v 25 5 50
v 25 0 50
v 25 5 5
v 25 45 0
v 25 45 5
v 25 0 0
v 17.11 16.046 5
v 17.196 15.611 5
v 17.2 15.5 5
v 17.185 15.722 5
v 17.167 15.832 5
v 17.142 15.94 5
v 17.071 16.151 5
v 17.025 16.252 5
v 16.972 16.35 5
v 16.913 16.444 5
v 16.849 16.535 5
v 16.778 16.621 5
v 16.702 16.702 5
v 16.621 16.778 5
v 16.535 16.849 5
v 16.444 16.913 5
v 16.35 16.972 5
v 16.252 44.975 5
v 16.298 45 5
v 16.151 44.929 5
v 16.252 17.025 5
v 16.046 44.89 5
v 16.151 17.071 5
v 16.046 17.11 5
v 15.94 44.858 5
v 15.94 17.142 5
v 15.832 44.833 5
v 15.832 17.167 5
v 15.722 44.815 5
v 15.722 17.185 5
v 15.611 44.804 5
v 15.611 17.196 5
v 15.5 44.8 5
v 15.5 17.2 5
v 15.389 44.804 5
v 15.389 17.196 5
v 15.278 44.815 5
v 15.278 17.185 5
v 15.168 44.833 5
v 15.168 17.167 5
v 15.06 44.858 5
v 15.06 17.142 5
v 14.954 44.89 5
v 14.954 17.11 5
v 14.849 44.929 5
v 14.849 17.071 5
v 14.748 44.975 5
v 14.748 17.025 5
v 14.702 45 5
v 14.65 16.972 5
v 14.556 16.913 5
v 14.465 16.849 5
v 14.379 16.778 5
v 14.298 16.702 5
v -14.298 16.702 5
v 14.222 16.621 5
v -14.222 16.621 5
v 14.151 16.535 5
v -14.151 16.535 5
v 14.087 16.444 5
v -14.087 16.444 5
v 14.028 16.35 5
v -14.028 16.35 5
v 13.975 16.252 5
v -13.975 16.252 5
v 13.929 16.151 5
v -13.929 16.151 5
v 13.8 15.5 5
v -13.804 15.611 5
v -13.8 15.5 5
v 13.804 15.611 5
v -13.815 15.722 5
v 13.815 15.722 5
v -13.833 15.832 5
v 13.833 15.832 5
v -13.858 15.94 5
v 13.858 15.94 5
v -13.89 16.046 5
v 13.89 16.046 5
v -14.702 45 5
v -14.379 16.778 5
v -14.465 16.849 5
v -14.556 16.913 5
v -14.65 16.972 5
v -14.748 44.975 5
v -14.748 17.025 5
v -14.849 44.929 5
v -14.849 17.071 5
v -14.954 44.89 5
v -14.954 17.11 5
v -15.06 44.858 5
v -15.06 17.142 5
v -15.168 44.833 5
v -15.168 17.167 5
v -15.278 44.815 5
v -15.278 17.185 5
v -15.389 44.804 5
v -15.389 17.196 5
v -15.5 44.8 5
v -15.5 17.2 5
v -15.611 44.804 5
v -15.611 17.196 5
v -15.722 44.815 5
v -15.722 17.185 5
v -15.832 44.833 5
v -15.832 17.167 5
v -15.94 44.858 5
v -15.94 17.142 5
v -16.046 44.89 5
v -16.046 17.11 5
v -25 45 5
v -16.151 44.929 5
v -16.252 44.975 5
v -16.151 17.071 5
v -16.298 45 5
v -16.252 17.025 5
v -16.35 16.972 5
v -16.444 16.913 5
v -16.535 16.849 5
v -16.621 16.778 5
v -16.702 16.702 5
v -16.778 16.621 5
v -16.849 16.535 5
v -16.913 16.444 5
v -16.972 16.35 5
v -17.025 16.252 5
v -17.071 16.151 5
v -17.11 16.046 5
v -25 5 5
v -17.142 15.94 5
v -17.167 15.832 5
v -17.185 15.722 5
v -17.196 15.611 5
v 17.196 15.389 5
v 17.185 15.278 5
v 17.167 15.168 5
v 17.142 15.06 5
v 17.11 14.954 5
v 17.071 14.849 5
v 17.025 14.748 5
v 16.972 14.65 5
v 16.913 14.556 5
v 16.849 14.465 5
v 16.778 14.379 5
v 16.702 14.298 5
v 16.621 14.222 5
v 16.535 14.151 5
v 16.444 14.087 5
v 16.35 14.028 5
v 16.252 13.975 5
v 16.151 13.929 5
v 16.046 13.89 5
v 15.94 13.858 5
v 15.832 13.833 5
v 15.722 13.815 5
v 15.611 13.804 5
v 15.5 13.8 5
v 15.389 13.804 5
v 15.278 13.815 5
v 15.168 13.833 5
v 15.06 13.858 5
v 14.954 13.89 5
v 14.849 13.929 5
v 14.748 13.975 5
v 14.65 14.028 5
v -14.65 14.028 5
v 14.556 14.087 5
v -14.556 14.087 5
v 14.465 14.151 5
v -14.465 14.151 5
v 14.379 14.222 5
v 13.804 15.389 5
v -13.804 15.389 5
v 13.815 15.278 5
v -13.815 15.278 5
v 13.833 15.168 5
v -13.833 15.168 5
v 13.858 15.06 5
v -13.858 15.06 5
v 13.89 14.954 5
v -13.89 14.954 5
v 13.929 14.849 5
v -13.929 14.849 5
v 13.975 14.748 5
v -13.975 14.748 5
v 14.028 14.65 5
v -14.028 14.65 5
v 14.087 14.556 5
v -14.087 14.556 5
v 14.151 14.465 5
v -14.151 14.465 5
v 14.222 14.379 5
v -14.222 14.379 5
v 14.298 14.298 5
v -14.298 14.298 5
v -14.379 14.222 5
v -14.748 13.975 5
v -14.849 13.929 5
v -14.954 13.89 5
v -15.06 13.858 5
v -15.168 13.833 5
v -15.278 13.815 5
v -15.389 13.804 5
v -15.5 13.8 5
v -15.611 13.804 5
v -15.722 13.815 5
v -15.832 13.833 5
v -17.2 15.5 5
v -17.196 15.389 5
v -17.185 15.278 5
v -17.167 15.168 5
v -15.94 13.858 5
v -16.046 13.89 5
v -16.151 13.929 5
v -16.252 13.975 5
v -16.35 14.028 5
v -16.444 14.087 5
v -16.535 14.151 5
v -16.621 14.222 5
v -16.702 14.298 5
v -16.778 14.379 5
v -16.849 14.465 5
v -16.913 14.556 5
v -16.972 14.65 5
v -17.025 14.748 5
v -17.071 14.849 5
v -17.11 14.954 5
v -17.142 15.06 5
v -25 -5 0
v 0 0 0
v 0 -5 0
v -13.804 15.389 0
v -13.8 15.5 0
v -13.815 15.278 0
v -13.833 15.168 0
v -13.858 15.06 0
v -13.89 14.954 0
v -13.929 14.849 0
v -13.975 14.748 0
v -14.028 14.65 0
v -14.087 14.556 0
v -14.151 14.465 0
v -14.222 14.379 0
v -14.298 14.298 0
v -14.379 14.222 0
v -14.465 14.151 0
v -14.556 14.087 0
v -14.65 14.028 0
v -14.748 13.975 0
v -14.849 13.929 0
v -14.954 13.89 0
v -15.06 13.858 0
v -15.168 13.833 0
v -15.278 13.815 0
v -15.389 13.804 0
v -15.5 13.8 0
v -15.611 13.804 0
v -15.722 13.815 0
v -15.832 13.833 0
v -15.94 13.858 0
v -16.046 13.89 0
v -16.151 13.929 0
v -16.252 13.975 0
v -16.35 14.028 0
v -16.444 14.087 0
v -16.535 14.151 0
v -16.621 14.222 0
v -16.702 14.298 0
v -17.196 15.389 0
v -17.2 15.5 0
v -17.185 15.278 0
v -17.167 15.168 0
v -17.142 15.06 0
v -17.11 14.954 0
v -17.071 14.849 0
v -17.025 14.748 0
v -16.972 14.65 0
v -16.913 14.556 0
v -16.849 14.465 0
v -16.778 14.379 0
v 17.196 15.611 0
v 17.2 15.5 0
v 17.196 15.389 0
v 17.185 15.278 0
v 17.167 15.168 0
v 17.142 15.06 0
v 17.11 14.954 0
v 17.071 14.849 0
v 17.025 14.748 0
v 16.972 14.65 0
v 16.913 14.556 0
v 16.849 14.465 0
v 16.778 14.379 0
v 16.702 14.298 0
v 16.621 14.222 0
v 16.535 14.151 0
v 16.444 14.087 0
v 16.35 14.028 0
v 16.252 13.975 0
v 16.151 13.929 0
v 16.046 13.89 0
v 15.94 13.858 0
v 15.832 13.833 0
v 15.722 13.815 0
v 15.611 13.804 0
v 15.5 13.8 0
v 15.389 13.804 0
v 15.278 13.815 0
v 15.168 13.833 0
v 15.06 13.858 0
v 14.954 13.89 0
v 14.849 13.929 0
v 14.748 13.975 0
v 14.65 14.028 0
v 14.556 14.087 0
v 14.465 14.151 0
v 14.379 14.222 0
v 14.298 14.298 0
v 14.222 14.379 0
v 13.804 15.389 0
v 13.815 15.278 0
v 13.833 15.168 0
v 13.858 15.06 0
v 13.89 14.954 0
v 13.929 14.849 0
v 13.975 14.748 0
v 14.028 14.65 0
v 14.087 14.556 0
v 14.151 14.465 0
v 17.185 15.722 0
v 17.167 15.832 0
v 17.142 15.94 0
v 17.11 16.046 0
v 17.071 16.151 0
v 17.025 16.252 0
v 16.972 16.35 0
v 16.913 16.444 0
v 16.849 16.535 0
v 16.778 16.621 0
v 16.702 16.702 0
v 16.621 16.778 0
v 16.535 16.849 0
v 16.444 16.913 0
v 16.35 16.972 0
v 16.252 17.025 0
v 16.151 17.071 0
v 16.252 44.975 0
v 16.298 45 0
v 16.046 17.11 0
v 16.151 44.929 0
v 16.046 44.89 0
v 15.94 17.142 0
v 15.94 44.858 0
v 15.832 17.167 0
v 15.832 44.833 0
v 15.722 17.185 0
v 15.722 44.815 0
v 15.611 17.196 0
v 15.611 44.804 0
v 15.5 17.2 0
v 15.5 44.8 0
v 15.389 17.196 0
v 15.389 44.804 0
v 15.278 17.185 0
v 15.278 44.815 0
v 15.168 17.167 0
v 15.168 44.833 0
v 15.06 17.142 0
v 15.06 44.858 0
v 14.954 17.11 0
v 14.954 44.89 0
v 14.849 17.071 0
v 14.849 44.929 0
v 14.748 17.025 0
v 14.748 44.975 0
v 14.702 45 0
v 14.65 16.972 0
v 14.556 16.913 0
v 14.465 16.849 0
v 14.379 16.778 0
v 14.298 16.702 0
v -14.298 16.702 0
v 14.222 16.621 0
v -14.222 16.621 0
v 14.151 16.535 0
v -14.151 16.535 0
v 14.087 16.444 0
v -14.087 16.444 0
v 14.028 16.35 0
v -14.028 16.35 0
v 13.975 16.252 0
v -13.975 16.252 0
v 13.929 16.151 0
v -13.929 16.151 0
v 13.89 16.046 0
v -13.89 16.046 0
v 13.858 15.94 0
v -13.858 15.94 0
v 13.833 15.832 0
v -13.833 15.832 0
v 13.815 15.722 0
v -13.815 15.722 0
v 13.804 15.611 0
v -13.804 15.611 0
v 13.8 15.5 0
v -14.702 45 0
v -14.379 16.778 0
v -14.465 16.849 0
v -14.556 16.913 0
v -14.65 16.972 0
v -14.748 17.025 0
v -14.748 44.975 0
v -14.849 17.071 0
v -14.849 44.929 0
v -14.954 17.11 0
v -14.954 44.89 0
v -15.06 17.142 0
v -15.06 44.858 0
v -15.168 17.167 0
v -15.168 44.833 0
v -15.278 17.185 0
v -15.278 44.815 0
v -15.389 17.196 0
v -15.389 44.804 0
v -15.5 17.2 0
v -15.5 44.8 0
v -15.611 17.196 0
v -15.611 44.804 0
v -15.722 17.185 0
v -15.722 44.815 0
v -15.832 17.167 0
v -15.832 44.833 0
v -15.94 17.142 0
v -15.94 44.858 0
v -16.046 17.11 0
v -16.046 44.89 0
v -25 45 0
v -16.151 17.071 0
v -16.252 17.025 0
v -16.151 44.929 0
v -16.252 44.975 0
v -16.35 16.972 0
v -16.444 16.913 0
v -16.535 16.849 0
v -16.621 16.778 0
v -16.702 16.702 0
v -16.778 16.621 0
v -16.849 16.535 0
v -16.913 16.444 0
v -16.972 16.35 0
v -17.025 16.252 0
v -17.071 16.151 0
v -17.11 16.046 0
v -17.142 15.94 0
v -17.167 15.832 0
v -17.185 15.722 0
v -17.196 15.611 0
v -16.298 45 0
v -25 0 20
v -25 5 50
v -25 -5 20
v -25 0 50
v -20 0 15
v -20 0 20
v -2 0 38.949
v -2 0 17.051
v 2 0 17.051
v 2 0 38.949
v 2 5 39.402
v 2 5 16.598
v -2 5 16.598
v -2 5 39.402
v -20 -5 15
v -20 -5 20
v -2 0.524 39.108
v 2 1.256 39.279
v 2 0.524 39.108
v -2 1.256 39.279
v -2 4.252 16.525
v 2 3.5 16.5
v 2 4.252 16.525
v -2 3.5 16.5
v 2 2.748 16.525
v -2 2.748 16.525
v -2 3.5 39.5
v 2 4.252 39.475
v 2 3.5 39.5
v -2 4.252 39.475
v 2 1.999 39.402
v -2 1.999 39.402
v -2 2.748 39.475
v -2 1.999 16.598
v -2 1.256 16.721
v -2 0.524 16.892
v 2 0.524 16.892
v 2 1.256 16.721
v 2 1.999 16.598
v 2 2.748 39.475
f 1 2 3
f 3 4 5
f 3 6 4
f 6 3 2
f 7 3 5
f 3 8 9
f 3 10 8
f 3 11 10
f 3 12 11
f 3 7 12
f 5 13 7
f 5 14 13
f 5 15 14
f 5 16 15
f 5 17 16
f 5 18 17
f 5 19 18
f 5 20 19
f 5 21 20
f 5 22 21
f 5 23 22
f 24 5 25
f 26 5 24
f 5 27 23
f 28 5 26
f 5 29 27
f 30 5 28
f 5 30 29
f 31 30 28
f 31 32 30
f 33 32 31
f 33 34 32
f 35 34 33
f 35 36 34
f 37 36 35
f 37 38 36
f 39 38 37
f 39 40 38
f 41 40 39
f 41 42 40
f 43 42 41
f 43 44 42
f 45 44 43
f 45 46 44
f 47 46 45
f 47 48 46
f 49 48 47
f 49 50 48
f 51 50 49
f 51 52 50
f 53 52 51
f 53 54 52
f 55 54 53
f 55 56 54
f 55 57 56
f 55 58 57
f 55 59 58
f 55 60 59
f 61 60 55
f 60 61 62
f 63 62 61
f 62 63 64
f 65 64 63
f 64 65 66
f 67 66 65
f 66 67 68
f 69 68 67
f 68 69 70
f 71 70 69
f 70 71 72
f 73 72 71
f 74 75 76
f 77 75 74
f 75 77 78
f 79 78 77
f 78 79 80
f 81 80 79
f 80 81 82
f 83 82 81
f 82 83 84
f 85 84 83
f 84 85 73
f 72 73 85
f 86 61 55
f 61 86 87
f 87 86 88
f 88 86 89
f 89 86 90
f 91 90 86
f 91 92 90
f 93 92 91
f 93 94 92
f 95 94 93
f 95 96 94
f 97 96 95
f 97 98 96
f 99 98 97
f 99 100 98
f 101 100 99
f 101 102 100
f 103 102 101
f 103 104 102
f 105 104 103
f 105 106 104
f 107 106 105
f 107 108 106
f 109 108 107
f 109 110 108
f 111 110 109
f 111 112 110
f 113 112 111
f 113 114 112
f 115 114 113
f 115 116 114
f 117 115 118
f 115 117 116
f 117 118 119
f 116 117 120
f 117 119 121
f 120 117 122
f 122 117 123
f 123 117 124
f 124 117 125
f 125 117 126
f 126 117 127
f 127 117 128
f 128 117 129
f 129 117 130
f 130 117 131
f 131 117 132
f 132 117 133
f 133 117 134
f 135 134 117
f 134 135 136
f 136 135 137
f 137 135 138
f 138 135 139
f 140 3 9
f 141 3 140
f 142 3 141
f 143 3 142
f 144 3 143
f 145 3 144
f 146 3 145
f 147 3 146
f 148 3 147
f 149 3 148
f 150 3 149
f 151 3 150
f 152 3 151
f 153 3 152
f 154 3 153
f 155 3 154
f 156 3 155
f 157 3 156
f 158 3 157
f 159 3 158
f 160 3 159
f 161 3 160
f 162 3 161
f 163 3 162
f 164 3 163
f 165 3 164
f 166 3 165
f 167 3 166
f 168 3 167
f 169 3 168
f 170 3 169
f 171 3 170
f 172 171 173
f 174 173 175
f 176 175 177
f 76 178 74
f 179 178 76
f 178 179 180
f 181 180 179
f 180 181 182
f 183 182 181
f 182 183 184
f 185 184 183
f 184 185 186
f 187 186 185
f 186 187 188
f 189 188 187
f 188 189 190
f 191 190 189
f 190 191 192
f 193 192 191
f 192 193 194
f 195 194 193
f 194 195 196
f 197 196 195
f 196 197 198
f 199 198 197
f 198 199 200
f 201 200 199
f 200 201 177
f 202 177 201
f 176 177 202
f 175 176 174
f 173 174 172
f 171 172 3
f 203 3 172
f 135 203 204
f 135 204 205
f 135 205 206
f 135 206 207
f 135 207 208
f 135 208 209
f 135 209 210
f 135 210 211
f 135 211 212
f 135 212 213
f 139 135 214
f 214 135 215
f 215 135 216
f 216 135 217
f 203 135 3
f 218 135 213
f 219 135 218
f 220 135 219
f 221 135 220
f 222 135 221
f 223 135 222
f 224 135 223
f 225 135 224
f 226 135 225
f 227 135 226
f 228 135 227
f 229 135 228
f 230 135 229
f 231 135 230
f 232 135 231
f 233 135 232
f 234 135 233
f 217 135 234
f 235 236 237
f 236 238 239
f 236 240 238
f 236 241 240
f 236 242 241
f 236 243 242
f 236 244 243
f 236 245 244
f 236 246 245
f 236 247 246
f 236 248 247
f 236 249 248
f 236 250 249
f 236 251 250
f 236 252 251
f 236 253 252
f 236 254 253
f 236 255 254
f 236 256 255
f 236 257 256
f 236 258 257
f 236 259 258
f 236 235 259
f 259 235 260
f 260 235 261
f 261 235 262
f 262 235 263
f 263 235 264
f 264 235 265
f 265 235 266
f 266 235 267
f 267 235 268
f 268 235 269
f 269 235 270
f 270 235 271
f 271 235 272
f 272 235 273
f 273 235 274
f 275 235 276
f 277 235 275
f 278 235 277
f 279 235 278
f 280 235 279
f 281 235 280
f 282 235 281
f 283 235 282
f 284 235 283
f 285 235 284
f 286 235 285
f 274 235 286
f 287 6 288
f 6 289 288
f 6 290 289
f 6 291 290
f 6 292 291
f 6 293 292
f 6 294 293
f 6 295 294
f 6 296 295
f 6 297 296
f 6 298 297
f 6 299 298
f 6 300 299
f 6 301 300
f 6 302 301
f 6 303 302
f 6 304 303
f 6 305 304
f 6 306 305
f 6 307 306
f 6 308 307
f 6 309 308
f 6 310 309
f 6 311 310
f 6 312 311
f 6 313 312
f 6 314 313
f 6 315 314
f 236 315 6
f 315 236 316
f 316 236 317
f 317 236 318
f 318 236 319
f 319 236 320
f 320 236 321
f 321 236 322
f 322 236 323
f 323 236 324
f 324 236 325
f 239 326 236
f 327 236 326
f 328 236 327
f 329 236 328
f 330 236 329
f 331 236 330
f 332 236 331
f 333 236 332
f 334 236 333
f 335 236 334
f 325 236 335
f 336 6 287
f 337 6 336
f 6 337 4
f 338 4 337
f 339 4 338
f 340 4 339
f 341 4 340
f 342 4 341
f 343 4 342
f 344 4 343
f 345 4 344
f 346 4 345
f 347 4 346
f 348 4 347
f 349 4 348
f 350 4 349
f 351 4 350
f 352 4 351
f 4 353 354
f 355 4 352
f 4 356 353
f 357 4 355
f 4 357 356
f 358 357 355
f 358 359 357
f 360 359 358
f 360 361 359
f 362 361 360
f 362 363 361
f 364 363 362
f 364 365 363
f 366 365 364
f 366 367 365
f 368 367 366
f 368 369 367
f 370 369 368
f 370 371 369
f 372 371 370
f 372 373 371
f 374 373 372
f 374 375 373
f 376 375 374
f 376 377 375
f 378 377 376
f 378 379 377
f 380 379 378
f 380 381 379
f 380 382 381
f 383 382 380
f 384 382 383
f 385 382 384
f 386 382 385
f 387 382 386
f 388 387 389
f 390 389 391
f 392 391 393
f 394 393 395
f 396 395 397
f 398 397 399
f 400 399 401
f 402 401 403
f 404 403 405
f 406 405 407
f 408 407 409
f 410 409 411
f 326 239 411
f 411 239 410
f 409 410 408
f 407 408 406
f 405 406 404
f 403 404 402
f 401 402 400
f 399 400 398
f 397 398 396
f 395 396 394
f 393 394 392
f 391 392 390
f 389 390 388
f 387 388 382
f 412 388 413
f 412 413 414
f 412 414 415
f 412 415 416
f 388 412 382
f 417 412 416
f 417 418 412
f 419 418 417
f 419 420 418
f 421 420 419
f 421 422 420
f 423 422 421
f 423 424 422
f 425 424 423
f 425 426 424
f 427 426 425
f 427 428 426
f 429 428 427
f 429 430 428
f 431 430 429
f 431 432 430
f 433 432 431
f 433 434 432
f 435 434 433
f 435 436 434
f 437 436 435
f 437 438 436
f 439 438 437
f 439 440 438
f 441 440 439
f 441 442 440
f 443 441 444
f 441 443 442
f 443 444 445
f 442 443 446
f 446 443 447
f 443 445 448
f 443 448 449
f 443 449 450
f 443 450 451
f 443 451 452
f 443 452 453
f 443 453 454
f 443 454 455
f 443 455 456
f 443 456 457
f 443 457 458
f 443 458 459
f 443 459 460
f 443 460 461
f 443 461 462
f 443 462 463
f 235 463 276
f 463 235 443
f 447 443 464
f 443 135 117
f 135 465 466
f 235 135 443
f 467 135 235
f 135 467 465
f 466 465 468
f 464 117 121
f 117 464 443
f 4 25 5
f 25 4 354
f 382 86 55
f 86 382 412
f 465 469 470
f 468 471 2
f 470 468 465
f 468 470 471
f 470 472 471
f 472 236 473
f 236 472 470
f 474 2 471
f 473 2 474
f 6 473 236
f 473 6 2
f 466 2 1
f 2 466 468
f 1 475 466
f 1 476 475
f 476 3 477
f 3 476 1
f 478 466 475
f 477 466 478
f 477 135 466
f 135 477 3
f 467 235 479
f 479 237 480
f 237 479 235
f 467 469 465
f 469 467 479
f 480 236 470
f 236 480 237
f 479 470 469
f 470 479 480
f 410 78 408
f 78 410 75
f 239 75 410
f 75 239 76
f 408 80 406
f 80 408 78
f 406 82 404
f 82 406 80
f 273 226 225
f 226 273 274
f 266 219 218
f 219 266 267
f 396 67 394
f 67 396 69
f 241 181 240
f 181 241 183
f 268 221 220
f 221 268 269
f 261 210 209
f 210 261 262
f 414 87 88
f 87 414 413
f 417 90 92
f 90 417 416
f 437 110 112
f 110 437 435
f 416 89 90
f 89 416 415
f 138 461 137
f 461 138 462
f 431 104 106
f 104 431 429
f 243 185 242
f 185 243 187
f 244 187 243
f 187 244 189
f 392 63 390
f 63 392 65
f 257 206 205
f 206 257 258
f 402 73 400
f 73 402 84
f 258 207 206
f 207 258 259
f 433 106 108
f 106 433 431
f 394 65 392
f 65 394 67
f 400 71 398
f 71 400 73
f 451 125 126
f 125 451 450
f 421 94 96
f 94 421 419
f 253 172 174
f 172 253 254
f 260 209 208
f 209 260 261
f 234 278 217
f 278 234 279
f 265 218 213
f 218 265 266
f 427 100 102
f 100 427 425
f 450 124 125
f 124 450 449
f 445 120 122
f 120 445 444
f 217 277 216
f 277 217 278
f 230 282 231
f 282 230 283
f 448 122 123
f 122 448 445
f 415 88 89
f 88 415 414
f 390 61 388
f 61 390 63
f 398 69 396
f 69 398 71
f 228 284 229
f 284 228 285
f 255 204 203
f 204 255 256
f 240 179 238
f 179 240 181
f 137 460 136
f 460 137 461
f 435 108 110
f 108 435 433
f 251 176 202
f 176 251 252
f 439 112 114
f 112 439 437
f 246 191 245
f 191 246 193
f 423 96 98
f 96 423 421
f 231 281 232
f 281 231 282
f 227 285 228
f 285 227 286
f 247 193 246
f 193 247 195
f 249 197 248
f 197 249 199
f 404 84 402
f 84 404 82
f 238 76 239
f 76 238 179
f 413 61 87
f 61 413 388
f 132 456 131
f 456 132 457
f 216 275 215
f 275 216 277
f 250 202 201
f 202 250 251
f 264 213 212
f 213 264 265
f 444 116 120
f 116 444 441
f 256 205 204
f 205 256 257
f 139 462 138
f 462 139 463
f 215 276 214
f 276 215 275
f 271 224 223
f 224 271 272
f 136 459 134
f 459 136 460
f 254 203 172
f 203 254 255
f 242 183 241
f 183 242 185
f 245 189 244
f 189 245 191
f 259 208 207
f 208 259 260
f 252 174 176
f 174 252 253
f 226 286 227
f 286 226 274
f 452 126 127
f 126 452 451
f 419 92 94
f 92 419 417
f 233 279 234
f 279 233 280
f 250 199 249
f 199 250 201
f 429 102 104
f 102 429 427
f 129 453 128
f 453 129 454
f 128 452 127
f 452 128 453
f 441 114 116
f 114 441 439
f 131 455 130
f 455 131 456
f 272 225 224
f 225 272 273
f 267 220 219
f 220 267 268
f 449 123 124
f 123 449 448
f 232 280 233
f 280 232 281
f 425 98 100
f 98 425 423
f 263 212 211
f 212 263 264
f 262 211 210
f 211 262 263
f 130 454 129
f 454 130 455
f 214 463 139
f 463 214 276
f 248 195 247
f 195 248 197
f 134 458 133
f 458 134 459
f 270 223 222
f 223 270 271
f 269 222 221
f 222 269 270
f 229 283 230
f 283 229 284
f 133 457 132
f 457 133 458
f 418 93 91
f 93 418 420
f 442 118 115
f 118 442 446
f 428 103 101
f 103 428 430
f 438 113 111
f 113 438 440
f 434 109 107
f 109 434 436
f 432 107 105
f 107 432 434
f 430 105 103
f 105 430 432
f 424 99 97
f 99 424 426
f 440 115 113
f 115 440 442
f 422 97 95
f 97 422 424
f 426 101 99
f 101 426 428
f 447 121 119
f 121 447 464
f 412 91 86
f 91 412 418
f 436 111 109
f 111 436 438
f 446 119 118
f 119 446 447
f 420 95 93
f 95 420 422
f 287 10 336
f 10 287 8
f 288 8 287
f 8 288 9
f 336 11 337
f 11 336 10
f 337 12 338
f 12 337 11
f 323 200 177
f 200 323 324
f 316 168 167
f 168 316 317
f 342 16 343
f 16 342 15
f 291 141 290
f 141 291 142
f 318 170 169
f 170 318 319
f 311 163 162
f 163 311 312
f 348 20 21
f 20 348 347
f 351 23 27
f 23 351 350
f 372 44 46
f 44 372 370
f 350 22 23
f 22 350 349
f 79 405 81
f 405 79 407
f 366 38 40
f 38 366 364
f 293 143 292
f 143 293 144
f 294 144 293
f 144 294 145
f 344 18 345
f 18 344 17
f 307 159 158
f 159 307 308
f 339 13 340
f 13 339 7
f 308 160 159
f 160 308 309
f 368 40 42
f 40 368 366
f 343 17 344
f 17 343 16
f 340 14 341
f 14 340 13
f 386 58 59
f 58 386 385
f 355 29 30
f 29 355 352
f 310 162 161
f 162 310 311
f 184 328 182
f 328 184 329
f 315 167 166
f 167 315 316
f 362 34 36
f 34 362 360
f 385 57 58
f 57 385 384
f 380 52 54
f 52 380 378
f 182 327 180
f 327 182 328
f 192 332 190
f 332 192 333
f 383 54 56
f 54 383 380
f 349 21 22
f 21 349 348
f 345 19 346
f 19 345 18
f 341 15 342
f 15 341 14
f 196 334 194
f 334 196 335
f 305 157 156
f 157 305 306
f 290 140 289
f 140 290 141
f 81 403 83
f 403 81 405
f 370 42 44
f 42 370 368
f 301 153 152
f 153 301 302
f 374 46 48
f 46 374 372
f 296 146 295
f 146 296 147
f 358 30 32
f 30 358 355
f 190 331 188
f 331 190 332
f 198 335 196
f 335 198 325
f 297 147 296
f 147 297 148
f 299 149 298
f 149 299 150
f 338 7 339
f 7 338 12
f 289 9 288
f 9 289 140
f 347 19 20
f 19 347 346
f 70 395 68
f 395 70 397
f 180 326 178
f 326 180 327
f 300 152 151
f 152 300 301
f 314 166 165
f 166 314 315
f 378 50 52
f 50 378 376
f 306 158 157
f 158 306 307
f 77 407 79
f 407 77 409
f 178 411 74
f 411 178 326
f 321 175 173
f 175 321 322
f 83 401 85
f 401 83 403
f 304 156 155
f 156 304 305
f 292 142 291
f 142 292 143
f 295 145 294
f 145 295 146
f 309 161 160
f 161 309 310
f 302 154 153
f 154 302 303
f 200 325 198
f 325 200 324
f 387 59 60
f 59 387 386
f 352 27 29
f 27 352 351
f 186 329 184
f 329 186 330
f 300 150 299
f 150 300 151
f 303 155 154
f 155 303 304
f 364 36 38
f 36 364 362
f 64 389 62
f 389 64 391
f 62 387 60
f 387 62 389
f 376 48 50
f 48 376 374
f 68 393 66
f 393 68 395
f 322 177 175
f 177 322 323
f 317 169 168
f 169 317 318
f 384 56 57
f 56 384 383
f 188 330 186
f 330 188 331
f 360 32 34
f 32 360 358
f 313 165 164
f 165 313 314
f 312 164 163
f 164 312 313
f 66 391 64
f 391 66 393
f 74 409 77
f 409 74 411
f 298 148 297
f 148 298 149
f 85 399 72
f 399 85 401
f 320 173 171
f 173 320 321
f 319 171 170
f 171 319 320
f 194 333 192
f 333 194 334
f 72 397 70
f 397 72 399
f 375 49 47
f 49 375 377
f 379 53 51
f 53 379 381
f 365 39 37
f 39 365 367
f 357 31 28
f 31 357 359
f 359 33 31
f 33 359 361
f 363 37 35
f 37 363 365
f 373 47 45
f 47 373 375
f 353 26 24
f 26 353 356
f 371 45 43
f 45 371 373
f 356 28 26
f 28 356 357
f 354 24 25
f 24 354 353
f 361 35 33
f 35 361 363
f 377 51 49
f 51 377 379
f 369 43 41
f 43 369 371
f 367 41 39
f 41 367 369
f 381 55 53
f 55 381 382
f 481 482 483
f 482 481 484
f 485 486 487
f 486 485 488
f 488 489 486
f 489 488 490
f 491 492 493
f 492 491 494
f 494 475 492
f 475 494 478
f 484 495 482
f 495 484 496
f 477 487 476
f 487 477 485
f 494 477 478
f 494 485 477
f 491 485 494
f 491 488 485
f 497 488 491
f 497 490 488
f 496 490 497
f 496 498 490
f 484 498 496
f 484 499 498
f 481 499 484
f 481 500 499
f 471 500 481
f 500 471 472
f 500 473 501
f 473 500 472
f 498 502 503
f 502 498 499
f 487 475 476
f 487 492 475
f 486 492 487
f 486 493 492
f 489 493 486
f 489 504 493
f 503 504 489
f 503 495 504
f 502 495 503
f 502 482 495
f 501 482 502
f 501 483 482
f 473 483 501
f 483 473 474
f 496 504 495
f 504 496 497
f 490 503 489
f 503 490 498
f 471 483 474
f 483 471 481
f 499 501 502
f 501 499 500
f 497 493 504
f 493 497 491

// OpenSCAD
// L-shaped mounting bracket for NEMA 17 stepper motor
// Print orientation: base plate on bed (z = 0), motor plate builds upward (+Z)

$fn = 96;

// ---- Base plate ----
base_x0 = -25;      // base plate X start
base_x1 = 25;       // base plate X end
base_y0 = 0;        // base plate Y start
base_y1 = 45;       // base plate Y end
base_z1 = 5;        // base plate thickness (Z)

// ---- Motor plate ----
motor_x0 = -25;     // motor plate X start
motor_x1 = 25;      // motor plate X end
motor_y0 = 0;       // motor plate Y start
motor_y1 = 5;       // motor plate thickness (Y)
motor_z0 = 0;       // motor plate Z start
motor_z1 = 50;      // motor plate top (Z)

// ---- Boss hole (motor centring) ----
boss_d     = 23;    // boss hole diameter
boss_x     = 0;     // boss hole centre X
boss_z     = 28;    // boss hole centre Z
boss_h     = motor_y1 - 2; // hole length along Y (clears walls by 2 mm)

// ---- Screw holes ----
screw_d    = 3.4;   // M3 screw hole diameter
screw_pat  = 31;    // square pattern side length
screw_n    = 4;     // number of screw holes

// ---- Gussets ----
gusset_t   = 5;     // gusset thickness (X)
gusset_leg = 20;    // right triangle leg length (Y and Z)
gusset_x0  = -25;   // left gusset X start
gusset_x1  = -20;   // left gusset X end / right gusset X start
// right gusset X end follows spec: x = 20 to 25

eps        = 0.5;   // cutter overshoot past faces

difference() {
    union() {
        // Base plate
        translate([base_x0, base_y0, 0])
            cube([base_x1 - base_x0, base_y1 - base_y0, base_z1]);

        // Motor plate
        translate([motor_x0, motor_y0, motor_z0])
            cube([motor_x1 - motor_x0, motor_y1 - motor_y0, motor_z1 - motor_z0]);

        // Left gusset: right triangle in YZ, legs along +Y and +Z
        translate([gusset_x0, 0, 0])
            rotate([90, 0, 0])
                linear_extrude(height = gusset_t)
                    polygon([[0, 0], [gusset_leg, 0], [0, gusset_leg]]);

        // Right gusset: same profile, shifted in X
        translate([gusset_x1, 0, 0])
            rotate([90, 0, 0])
                linear_extrude(height = gusset_t)
                    polygon([[0, 0], [gusset_leg, 0], [0, gusset_leg]]);
    }

    // Boss hole along Y
    translate([boss_x, motor_y1 - boss_h / 2, boss_z])
        rotate([0, 90, 0])
            cylinder(d = boss_d, h = boss_h + 2 * eps, center = true);

    // Screw holes on square pattern, centred on boss hole
    for (i = [0 : screw_n - 1]) {
        for (j = [0 : screw_n - 1]) {
            x = (i - (screw_n - 1) / 2) * screw_pat;
            y = (j - (screw_n - 1) / 2) * screw_pat;
            translate([x, y, -eps])
                cylinder(d = screw_d, h = base_z1 + motor_z1 + 2 * eps);
        }
    }
}
